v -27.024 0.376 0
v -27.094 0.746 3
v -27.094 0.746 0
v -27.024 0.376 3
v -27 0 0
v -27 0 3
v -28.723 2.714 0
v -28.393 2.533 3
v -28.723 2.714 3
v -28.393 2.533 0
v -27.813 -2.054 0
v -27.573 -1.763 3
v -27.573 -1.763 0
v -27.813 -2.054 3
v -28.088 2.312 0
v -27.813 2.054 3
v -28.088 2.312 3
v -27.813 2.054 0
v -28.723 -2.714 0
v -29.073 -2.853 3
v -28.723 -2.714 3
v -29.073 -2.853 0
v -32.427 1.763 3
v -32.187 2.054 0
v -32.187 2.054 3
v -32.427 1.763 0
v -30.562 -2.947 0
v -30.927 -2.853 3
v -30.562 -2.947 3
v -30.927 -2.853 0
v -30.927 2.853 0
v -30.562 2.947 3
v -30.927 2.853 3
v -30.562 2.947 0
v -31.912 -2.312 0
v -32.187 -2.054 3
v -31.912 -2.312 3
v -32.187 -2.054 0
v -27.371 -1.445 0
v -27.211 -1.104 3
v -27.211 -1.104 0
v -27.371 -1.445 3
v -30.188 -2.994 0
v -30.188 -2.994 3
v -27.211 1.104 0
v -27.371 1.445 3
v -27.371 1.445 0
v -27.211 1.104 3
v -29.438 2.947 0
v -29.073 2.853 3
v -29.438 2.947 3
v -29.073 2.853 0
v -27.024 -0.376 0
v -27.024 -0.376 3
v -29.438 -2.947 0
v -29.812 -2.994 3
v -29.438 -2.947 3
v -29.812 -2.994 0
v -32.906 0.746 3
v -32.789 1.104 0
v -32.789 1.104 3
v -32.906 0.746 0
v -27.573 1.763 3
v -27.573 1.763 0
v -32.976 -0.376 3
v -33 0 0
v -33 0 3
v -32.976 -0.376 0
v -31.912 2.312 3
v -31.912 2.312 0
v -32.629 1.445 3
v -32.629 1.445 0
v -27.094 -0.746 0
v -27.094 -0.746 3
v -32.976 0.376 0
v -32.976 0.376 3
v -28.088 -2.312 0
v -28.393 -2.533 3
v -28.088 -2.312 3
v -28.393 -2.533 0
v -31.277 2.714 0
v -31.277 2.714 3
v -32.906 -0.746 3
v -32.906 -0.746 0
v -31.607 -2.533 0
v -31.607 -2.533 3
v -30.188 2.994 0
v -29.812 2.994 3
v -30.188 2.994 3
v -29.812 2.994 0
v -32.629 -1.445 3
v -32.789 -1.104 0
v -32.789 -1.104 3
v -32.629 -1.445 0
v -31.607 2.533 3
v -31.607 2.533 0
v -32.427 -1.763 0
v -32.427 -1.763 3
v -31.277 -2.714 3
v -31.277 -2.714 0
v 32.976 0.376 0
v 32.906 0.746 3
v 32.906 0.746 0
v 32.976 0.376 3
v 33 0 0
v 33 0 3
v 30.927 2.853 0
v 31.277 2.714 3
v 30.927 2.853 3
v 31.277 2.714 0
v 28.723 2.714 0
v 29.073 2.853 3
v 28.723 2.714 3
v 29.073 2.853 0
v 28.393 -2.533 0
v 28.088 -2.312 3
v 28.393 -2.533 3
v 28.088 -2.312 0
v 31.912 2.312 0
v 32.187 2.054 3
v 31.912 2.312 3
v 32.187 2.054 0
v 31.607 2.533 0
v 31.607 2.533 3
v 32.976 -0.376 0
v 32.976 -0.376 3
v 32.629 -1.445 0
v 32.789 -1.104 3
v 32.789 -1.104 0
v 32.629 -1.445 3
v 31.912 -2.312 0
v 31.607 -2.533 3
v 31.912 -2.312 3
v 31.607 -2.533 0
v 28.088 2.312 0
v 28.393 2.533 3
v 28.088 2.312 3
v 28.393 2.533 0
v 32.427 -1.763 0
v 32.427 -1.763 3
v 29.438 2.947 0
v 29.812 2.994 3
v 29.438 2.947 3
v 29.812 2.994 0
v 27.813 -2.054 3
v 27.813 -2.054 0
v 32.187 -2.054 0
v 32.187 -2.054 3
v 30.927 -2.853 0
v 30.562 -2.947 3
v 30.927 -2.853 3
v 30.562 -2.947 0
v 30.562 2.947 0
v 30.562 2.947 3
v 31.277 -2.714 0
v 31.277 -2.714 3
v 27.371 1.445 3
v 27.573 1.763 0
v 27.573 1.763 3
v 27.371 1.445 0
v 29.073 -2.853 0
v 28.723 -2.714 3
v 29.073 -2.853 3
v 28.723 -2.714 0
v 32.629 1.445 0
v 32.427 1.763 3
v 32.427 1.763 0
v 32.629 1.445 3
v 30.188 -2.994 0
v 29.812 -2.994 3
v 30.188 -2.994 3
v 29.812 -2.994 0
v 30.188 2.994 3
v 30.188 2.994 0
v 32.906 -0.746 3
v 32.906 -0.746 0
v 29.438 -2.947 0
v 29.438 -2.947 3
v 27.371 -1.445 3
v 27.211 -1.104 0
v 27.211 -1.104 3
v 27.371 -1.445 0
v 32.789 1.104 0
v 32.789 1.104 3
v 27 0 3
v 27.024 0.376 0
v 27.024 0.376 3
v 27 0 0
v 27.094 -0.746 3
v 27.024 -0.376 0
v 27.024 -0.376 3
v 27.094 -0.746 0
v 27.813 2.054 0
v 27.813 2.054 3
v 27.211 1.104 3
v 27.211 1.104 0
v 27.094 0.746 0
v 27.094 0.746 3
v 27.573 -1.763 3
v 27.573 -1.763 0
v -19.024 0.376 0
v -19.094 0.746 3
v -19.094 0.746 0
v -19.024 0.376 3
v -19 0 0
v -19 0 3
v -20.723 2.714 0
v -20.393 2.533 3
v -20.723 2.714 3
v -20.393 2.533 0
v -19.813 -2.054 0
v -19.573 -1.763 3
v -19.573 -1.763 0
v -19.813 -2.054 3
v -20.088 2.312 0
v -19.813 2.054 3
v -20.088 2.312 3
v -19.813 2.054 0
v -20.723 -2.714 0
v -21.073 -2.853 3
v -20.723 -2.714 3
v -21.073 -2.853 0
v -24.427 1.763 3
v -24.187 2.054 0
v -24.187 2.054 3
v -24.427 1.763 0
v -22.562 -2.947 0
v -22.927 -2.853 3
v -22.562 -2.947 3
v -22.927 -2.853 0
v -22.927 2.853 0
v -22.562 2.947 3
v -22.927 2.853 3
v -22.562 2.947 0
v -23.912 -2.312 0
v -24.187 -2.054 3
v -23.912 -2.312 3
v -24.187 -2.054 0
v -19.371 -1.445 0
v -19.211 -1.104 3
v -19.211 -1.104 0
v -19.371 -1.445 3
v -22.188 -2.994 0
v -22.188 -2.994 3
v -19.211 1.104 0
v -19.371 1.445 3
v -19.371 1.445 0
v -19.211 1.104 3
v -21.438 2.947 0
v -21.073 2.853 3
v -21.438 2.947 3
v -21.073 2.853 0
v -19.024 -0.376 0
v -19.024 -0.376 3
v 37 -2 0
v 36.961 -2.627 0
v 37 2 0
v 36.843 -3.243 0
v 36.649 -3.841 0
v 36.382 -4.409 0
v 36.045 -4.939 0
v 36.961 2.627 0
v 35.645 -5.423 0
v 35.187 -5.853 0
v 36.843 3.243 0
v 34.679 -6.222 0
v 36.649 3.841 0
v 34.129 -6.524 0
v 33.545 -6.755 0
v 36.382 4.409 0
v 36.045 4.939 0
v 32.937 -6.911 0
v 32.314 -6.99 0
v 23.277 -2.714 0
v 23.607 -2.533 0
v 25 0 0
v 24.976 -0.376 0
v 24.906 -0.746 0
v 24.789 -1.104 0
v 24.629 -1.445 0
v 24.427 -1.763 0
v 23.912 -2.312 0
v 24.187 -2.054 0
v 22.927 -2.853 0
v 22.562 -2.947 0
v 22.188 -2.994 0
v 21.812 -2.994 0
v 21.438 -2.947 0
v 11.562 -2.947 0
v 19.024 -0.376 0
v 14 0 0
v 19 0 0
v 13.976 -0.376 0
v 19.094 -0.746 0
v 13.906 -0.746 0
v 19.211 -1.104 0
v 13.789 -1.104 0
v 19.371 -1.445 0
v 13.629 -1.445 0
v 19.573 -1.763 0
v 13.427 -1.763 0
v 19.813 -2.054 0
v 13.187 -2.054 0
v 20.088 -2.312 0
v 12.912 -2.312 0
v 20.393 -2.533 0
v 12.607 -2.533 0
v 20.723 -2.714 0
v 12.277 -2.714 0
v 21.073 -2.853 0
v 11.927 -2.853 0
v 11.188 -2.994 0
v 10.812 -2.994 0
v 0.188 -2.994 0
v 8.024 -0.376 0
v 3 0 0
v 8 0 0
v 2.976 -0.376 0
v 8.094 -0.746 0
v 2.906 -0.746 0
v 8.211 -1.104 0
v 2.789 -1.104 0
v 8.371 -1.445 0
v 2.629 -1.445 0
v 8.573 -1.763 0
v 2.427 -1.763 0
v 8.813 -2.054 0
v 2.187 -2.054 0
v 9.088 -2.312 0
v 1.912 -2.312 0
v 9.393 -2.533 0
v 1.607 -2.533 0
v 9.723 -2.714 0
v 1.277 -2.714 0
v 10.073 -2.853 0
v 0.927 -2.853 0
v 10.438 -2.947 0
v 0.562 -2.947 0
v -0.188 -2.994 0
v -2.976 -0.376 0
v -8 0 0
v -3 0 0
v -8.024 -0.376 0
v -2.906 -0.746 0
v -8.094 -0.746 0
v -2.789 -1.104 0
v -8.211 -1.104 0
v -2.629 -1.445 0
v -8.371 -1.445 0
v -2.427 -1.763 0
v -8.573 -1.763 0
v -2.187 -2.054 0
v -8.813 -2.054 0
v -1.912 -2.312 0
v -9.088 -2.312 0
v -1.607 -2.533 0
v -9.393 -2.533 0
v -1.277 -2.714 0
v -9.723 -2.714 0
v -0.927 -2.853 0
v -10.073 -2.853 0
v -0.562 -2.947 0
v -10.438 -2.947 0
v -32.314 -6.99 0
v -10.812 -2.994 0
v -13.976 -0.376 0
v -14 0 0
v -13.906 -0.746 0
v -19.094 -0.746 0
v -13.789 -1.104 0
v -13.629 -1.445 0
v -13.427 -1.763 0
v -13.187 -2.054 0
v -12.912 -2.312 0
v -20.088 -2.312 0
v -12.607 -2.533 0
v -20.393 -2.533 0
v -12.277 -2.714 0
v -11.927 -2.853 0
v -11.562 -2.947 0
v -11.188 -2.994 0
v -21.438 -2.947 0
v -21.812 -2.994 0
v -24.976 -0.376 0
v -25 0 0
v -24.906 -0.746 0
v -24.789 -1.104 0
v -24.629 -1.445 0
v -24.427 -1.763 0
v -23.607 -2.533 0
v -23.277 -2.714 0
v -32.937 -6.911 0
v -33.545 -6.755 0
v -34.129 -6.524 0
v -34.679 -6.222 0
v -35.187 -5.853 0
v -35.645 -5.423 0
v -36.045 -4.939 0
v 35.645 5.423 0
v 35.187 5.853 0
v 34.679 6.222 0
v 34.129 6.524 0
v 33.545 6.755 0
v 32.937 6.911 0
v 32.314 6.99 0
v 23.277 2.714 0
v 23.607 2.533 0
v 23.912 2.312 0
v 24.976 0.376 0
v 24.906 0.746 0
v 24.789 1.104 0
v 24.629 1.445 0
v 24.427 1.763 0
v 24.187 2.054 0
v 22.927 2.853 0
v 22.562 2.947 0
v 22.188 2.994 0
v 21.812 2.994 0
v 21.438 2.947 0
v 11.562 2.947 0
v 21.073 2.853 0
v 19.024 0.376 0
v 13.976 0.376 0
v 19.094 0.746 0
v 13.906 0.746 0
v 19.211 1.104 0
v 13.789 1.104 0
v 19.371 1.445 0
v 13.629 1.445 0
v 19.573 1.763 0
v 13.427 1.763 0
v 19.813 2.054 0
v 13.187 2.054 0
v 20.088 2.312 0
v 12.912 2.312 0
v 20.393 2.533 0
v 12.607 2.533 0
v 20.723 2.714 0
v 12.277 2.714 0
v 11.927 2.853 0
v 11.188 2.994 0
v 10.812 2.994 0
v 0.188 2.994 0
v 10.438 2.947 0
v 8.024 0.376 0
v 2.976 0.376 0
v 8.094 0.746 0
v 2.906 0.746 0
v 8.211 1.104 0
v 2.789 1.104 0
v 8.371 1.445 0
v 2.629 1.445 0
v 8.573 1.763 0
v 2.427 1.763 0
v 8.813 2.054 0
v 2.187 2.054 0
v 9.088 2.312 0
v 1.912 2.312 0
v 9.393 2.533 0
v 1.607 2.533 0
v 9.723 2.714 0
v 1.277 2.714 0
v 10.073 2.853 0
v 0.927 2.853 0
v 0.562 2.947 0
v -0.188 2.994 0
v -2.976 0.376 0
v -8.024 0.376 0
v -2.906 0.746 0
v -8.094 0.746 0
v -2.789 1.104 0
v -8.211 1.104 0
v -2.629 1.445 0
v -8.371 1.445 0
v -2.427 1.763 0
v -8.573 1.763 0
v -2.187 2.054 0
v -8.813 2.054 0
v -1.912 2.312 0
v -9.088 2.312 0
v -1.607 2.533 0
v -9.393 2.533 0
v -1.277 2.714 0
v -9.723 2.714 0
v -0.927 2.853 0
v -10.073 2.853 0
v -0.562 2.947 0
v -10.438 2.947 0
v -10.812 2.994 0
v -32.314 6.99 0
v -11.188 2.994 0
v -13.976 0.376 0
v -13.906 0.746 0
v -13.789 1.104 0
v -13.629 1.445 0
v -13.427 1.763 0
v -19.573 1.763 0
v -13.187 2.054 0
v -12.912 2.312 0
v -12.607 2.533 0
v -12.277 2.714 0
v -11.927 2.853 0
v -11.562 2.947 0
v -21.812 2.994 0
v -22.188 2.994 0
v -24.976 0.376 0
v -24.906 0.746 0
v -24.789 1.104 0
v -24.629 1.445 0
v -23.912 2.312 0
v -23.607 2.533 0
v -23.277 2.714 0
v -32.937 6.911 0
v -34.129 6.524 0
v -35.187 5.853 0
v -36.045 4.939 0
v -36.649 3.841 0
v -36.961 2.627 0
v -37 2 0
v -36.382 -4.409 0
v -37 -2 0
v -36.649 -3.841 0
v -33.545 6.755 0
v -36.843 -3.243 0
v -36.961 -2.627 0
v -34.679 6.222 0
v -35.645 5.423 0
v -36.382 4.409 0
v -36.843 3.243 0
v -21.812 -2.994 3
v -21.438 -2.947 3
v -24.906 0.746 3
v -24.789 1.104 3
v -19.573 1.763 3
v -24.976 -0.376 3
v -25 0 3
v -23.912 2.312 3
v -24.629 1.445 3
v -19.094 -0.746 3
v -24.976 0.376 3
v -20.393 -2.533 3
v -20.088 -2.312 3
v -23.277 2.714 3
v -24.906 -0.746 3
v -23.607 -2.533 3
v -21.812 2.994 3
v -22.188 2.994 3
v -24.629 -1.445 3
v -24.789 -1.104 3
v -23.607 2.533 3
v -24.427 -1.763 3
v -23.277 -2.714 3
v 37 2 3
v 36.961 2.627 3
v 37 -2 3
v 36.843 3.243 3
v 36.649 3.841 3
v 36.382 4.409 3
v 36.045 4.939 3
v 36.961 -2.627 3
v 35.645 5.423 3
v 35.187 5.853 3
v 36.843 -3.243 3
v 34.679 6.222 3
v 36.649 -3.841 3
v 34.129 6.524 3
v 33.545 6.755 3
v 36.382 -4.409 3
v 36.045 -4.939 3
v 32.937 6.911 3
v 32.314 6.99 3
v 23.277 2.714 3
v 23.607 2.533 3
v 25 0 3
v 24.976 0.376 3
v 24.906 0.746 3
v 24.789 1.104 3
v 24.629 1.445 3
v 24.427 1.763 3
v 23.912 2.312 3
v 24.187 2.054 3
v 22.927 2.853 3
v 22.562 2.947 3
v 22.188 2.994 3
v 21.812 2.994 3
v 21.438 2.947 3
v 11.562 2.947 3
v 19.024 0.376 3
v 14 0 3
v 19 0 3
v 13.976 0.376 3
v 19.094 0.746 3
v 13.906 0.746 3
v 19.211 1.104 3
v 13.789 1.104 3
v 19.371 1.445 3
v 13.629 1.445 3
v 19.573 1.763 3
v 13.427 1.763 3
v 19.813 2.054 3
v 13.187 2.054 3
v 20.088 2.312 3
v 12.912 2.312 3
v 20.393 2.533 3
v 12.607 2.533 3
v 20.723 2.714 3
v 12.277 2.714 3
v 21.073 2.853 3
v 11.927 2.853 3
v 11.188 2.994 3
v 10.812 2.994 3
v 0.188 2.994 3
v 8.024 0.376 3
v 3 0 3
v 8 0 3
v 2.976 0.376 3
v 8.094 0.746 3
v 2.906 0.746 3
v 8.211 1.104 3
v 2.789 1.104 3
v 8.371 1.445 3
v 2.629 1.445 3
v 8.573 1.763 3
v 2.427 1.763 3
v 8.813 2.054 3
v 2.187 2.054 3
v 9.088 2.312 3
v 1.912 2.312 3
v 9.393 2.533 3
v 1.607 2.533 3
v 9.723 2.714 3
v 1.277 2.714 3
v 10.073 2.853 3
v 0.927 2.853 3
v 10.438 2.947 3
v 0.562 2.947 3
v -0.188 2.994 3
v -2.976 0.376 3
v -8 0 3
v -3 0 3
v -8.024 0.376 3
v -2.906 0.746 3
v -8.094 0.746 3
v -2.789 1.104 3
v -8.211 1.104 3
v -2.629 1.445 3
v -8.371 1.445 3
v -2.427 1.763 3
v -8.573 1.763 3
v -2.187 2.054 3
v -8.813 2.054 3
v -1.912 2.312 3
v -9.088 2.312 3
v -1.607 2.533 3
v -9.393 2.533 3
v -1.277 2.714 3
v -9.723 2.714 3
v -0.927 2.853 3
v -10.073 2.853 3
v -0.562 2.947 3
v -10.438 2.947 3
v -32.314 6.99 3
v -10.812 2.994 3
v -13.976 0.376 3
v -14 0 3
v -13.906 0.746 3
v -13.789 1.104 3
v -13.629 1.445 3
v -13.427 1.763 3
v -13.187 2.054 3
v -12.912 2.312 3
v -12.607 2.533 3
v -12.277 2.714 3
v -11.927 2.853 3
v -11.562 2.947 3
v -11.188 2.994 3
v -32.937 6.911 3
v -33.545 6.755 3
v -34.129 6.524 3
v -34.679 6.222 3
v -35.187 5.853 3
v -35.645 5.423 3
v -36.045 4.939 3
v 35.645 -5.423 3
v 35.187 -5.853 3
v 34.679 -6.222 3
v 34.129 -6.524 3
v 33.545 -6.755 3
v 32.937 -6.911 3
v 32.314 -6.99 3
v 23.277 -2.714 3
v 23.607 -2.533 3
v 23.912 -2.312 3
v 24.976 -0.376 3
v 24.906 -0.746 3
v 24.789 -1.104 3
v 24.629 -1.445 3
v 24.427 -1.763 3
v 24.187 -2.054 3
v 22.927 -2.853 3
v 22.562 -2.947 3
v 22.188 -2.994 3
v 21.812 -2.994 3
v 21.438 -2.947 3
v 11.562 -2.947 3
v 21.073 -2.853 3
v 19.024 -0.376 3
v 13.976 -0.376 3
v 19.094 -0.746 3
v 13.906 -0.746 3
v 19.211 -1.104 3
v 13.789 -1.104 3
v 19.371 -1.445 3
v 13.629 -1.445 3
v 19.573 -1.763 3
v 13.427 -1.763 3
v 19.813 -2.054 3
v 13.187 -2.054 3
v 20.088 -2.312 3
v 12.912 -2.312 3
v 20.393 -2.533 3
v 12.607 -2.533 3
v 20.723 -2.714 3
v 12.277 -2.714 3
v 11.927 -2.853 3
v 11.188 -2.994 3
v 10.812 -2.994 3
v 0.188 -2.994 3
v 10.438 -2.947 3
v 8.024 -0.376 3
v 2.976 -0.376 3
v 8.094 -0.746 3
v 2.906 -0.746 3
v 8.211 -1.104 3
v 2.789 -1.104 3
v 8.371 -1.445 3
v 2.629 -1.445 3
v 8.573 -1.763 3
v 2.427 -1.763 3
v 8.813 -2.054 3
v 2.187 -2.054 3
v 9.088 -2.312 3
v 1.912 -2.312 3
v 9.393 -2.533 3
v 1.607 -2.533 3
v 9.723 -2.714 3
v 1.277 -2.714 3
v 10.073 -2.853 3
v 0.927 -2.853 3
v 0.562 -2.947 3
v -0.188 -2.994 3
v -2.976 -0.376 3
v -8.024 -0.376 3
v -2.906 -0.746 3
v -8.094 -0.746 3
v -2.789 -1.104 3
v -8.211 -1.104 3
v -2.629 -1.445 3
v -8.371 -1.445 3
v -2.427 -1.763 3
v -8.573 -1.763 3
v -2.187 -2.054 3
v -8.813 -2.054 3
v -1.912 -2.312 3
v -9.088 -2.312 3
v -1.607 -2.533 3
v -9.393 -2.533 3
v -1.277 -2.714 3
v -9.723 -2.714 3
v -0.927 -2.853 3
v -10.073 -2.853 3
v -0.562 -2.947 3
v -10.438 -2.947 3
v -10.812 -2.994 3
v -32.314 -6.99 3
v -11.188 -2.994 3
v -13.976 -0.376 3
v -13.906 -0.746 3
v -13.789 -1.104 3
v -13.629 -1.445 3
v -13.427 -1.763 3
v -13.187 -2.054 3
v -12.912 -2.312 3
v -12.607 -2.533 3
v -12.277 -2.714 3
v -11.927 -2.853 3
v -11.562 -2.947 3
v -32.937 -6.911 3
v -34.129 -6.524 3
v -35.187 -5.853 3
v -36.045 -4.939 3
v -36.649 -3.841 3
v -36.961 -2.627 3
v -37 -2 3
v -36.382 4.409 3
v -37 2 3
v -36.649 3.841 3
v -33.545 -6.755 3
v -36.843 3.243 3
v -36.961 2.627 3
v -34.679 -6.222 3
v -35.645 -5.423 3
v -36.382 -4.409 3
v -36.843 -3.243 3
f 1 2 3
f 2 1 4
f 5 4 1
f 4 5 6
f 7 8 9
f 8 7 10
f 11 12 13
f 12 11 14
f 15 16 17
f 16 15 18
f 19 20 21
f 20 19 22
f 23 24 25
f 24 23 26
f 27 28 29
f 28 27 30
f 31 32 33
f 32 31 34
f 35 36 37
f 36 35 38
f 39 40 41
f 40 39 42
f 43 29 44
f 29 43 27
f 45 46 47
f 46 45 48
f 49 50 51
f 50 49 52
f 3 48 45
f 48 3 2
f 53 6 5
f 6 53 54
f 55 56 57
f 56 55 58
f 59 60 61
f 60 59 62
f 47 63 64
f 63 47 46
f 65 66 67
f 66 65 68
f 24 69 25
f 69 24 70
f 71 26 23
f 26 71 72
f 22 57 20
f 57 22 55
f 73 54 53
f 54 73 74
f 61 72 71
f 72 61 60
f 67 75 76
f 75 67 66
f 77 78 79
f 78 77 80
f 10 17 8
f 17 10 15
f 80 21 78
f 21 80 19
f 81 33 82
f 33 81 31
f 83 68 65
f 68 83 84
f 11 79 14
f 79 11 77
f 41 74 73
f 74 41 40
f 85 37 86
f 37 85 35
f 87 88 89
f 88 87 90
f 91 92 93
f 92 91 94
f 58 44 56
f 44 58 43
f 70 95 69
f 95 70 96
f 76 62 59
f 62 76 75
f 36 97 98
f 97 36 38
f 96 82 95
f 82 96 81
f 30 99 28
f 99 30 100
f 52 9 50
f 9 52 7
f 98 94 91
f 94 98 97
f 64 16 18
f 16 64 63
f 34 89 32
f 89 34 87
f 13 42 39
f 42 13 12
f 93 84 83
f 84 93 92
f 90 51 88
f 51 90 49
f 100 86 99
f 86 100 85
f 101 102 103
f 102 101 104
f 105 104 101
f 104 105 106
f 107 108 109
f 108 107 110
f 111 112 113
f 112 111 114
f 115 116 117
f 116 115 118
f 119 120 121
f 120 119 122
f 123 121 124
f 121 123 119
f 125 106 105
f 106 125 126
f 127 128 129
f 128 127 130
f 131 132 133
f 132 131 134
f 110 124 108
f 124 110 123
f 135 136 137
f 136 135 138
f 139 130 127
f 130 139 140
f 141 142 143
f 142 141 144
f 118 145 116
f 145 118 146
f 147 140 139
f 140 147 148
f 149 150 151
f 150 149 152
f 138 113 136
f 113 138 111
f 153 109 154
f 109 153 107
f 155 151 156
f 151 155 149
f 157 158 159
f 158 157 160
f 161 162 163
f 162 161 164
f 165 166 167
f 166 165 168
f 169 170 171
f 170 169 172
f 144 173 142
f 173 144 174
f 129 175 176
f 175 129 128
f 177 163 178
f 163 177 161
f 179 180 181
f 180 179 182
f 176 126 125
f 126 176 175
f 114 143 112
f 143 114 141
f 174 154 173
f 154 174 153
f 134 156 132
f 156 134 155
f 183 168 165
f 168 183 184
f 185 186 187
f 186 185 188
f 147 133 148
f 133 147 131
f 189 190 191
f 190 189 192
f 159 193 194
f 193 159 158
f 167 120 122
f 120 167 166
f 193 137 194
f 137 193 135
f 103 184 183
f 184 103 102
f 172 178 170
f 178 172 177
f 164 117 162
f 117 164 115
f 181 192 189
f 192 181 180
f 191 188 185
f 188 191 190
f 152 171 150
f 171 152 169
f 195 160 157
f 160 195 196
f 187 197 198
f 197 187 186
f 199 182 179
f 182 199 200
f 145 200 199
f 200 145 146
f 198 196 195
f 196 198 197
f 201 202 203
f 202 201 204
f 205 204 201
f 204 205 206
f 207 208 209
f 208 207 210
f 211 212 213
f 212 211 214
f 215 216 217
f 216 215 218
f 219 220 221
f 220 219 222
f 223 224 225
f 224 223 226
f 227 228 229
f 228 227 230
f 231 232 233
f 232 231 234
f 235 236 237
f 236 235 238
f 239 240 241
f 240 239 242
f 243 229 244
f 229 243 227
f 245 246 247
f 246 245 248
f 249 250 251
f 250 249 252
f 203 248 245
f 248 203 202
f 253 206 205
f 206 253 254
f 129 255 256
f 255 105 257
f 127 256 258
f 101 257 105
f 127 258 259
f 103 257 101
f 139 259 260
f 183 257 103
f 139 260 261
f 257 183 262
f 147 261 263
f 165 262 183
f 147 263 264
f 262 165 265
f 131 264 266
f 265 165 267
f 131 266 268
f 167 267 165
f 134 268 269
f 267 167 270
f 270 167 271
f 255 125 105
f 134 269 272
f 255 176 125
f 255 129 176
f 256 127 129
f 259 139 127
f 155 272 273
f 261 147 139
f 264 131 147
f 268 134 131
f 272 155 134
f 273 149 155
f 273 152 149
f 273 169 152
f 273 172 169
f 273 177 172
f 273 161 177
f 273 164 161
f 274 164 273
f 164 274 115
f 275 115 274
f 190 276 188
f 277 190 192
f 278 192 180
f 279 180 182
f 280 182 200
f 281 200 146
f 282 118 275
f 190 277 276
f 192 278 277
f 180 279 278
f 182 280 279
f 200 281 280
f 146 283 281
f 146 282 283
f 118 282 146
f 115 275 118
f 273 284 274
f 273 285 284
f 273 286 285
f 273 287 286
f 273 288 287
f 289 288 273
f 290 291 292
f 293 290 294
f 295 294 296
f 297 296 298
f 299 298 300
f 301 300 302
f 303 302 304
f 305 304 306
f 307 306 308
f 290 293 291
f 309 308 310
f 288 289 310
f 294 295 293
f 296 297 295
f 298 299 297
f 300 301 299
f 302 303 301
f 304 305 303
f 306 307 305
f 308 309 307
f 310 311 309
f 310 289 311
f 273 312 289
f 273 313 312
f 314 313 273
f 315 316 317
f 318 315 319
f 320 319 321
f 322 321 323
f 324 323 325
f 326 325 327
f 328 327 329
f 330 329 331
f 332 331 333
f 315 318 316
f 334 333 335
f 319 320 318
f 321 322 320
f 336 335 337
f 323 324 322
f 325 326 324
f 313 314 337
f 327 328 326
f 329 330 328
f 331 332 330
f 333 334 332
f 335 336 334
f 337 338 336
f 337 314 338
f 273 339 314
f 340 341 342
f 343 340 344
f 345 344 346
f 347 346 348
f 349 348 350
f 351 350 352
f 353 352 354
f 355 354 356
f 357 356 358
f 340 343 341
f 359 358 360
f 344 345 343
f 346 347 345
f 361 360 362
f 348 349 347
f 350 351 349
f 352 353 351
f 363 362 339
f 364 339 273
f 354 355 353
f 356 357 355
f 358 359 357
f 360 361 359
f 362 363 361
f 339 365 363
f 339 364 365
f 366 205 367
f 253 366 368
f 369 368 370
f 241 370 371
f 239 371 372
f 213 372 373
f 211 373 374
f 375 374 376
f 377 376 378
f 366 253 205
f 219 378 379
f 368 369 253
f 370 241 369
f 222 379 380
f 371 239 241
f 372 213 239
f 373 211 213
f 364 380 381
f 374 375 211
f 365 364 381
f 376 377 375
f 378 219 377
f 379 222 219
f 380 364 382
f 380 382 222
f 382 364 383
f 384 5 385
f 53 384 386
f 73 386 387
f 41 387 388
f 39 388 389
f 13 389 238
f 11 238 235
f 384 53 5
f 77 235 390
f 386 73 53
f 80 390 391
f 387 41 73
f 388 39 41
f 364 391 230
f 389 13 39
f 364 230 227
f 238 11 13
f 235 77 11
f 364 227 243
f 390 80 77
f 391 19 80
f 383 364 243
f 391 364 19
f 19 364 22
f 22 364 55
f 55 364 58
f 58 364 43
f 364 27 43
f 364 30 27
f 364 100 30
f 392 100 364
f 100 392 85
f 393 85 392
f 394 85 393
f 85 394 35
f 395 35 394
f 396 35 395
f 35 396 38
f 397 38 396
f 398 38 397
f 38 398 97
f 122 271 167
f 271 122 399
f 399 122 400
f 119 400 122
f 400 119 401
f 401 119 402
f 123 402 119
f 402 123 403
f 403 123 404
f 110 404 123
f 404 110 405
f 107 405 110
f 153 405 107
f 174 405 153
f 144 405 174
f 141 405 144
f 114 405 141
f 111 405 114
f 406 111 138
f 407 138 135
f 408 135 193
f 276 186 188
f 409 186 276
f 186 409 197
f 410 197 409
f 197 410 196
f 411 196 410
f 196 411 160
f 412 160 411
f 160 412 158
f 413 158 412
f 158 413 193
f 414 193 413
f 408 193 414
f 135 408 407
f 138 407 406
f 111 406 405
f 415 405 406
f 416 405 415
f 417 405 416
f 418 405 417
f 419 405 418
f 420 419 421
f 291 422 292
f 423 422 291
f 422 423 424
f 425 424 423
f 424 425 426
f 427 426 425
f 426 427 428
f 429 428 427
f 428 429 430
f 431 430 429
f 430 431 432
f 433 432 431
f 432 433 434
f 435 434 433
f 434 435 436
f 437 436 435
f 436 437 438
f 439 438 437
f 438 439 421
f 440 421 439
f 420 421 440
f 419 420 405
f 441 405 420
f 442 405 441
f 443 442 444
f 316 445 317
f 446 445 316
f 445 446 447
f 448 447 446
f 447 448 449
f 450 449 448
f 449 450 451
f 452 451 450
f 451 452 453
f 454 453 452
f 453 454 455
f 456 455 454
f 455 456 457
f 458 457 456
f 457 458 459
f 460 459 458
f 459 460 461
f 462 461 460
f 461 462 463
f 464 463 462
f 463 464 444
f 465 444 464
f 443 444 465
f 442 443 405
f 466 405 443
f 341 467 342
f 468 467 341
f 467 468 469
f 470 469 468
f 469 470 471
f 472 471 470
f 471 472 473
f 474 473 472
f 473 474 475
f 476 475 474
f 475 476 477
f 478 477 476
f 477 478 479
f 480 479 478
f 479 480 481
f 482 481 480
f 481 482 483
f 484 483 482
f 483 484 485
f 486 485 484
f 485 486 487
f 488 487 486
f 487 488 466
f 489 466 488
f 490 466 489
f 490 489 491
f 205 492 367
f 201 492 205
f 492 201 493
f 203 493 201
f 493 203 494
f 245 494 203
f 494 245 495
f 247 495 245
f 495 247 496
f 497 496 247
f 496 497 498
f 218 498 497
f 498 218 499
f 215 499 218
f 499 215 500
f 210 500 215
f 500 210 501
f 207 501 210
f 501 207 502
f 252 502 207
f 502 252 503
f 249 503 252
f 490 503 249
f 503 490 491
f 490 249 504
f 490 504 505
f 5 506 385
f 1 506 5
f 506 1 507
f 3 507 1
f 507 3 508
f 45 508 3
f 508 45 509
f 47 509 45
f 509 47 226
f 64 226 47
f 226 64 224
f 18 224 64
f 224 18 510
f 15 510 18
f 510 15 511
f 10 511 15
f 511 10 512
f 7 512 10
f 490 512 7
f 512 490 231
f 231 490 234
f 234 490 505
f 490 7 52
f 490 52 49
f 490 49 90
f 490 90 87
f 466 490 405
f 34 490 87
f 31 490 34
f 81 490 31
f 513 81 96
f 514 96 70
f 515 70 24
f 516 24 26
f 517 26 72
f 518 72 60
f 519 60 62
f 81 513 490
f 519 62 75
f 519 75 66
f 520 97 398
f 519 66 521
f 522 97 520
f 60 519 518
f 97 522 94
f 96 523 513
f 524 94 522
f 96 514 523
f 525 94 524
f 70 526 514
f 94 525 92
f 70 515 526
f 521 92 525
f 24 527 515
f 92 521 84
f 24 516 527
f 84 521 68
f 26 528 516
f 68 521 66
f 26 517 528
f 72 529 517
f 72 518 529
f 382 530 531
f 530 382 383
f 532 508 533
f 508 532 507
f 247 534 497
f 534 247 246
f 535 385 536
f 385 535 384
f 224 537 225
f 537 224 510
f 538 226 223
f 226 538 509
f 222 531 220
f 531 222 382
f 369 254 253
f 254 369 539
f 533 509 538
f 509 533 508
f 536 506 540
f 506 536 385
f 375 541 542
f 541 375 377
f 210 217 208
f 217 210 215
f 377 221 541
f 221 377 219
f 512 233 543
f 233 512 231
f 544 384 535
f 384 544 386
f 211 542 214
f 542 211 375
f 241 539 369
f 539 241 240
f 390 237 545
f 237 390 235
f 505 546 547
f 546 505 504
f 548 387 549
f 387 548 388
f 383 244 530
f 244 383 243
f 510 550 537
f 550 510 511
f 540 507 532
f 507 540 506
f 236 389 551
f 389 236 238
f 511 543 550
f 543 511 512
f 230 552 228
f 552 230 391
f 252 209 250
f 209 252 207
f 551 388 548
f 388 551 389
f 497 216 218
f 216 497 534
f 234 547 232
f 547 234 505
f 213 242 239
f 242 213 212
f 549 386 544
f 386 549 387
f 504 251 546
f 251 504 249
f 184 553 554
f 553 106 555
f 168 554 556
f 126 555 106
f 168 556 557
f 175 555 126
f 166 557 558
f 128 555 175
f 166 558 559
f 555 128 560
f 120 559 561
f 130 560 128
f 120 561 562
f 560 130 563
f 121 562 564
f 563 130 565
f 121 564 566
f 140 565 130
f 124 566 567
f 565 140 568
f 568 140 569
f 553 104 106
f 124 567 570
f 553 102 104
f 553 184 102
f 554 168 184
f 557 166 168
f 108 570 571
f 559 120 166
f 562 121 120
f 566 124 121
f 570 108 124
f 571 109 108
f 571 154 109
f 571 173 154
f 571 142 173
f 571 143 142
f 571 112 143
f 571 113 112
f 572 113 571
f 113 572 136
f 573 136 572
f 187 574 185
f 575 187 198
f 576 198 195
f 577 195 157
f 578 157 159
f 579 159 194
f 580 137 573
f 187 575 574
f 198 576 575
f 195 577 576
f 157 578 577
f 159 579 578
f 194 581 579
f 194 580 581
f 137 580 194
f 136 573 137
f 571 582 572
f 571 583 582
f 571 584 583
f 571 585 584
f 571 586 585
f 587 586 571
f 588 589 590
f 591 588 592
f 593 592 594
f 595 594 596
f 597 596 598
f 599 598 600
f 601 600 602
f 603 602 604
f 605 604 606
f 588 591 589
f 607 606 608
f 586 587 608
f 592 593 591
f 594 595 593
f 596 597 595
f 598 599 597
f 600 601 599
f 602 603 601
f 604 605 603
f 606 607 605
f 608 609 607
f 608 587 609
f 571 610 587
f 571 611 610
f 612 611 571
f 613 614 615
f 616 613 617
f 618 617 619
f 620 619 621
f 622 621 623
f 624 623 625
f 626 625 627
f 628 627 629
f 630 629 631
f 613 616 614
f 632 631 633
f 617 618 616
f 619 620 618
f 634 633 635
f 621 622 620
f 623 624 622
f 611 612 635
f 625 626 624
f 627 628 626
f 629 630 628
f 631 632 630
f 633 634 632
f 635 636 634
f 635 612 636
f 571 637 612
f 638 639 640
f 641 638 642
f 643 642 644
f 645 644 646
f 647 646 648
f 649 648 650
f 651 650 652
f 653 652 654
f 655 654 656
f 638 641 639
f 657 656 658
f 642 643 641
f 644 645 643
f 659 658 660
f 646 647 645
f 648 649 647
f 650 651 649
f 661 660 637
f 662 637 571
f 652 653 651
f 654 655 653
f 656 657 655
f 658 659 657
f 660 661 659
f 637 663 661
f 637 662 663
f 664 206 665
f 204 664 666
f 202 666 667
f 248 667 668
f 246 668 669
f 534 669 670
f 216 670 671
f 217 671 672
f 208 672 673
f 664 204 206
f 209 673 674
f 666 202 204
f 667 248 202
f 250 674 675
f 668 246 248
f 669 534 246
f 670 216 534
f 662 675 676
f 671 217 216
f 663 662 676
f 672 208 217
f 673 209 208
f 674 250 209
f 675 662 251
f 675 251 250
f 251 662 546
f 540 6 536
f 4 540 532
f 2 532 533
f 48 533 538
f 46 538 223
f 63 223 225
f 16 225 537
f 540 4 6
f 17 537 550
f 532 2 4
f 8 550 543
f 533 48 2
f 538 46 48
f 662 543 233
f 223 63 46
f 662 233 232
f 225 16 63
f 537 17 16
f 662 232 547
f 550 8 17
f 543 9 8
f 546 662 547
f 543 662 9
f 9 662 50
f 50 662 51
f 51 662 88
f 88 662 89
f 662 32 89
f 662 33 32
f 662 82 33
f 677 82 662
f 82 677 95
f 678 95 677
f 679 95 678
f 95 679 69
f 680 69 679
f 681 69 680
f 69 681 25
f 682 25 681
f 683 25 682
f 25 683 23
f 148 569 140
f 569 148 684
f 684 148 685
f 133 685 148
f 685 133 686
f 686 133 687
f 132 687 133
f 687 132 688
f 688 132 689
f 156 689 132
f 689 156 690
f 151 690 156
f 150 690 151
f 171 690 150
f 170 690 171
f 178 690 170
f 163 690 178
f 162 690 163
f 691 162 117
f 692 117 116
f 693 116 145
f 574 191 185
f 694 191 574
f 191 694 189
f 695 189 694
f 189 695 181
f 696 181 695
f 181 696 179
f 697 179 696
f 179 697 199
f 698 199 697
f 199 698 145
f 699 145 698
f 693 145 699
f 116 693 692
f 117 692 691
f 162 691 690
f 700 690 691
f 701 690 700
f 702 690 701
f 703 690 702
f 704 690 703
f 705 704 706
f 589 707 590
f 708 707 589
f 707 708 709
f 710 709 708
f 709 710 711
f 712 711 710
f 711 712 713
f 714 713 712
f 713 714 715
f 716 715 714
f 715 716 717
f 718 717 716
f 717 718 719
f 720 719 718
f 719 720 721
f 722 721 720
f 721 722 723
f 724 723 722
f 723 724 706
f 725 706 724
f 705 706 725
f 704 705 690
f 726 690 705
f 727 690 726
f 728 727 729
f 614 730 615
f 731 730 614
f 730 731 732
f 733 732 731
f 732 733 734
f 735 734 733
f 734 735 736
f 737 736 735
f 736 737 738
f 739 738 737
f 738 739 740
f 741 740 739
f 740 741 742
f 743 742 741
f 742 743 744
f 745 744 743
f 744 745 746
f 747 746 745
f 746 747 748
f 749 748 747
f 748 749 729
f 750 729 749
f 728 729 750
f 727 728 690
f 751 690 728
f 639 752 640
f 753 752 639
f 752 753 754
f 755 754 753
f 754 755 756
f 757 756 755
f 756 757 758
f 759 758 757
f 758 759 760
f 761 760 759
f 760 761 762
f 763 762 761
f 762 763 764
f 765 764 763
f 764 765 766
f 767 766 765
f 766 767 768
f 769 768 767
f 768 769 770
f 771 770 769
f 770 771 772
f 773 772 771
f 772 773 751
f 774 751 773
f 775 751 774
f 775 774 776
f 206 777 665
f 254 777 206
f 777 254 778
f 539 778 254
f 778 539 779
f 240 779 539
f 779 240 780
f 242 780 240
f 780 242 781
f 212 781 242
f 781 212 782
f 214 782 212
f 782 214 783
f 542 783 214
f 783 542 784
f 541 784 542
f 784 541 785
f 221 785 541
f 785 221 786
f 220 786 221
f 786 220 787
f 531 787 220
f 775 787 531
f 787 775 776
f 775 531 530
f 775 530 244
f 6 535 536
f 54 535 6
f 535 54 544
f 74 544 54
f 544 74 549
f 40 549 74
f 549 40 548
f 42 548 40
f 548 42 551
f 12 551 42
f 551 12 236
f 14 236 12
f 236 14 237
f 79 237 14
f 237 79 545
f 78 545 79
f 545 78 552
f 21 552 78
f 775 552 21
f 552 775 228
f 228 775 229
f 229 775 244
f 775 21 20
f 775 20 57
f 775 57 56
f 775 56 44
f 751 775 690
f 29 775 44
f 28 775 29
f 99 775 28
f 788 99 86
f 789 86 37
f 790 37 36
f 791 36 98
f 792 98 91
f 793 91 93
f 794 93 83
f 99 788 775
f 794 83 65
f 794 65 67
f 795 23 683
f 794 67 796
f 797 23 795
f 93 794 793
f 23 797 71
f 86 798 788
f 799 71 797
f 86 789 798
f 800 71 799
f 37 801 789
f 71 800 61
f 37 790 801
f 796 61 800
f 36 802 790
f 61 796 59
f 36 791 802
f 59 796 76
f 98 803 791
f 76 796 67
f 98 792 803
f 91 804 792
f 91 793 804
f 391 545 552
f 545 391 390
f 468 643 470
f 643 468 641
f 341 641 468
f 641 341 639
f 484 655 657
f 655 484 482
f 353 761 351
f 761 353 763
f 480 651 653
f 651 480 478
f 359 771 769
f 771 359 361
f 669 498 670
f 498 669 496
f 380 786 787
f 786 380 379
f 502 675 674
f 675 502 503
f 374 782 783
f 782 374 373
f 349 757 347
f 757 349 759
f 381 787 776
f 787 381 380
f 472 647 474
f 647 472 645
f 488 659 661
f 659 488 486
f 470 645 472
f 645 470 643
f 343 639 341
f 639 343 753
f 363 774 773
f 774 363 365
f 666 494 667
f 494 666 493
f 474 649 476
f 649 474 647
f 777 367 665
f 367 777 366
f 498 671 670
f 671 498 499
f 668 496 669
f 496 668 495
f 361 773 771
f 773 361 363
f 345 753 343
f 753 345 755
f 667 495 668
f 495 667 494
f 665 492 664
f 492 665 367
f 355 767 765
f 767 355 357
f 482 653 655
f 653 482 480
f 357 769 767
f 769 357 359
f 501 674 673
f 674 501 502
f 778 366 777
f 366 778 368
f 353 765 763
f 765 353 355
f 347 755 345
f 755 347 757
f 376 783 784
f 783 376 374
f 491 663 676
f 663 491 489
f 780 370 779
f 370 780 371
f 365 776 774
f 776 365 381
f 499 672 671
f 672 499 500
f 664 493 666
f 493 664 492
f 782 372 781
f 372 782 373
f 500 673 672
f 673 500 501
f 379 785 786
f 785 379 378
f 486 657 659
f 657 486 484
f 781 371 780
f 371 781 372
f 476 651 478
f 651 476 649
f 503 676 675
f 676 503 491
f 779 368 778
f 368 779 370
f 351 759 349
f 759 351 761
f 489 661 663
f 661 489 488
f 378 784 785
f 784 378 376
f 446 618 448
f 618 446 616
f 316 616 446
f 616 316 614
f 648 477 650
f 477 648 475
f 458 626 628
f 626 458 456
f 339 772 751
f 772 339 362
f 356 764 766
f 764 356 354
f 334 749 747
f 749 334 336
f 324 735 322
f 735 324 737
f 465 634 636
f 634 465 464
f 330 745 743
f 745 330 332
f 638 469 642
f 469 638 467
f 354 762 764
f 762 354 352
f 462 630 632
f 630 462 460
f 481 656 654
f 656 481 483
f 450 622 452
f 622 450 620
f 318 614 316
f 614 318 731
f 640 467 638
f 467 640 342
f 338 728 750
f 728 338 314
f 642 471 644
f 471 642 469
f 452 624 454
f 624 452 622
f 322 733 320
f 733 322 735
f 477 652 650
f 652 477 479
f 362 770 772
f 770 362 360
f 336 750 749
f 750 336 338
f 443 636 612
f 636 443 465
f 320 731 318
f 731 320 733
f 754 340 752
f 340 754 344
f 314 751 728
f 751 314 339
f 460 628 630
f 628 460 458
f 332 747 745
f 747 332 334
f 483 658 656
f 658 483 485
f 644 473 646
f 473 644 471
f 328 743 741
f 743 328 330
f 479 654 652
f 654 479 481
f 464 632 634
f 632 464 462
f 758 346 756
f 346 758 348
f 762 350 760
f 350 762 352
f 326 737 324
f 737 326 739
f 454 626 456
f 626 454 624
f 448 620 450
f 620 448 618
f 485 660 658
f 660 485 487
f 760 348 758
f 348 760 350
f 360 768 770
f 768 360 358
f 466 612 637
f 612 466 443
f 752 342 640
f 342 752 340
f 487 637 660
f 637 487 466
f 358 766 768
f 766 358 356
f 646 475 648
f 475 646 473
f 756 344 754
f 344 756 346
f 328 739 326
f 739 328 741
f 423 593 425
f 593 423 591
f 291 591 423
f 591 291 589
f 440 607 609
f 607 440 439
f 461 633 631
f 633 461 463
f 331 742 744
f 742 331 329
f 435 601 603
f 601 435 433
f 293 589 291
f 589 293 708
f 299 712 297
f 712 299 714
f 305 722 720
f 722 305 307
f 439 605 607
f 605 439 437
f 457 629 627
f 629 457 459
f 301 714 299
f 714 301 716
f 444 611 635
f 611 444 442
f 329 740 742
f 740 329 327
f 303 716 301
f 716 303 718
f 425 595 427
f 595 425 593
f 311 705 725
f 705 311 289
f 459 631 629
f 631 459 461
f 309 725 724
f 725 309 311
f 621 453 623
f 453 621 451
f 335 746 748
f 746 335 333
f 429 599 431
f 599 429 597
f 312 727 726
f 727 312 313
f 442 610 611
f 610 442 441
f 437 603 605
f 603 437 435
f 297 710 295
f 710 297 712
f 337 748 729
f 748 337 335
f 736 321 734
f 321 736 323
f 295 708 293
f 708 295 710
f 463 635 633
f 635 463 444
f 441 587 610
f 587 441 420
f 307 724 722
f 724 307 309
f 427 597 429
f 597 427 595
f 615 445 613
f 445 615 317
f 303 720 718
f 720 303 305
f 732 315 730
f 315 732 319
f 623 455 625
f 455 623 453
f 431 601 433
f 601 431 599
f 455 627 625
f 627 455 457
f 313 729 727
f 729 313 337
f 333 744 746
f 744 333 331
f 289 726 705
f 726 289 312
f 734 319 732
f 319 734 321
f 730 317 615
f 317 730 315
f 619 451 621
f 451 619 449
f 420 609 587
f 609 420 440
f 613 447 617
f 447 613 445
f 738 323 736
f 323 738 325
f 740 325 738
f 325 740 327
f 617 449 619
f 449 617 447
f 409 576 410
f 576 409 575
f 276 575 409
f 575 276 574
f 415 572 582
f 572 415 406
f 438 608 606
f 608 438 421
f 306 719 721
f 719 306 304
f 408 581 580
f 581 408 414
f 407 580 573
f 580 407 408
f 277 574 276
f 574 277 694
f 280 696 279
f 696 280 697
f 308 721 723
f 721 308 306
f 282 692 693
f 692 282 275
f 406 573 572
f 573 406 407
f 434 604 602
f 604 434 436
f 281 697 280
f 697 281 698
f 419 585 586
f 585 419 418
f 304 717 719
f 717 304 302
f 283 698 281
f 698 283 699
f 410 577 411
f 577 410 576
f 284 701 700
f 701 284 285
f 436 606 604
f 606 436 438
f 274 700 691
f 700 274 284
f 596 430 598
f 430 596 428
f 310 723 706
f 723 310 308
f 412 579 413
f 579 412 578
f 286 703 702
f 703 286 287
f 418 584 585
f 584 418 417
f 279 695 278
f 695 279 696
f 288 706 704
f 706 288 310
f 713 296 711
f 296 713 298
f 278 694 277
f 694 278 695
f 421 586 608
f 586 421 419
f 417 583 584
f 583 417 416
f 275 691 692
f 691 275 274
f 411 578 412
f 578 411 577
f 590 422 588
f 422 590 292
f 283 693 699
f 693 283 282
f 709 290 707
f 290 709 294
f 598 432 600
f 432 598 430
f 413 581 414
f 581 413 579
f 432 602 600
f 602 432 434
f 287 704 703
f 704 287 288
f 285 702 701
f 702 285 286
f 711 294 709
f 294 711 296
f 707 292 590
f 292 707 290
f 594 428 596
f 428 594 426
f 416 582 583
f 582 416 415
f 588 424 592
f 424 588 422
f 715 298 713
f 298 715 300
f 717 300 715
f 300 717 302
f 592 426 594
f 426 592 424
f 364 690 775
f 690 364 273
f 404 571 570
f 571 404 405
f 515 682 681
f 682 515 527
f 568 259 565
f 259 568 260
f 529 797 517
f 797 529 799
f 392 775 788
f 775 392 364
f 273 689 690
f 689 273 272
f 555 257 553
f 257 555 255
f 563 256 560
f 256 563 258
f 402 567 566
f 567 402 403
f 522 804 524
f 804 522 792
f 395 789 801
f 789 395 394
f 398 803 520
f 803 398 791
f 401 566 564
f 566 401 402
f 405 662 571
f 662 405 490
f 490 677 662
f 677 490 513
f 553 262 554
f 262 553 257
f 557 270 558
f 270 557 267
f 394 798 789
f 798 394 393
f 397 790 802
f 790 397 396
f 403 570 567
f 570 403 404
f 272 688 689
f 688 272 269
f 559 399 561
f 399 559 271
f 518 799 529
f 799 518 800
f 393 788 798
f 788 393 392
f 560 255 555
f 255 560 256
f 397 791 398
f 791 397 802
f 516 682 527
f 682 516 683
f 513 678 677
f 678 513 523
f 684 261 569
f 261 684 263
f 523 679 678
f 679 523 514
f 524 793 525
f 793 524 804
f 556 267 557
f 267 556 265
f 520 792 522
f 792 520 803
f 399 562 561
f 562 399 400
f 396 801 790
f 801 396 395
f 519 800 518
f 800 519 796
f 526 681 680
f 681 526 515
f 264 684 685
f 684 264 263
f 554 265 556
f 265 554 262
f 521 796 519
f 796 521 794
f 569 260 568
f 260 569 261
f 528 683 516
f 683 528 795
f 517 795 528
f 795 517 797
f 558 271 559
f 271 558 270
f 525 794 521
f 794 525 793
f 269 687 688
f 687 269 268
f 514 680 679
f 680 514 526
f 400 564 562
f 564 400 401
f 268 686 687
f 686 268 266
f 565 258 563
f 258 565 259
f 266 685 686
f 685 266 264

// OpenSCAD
$fn = 50;


difference() {
	union() {
		hull() {
			translate(v = [-32.0000000000, 2.0000000000, 0]) {
				cylinder(h = 3, r = 5);
			}
			translate(v = [32.0000000000, 2.0000000000, 0]) {
				cylinder(h = 3, r = 5);
			}
			translate(v = [-32.0000000000, -2.0000000000, 0]) {
				cylinder(h = 3, r = 5);
			}
			translate(v = [32.0000000000, -2.0000000000, 0]) {
				cylinder(h = 3, r = 5);
			}
		}
	}
	union() {
		#translate(v = [-30.0000000000, 0.0000000000, 0]) {
			cylinder(h = 3, r = 3.0000000000);
		}
		#translate(v = [30.0000000000, 0.0000000000, 0]) {
			cylinder(h = 3, r = 3.0000000000);
		}
		#translate(v = [-30.0000000000, 0.0000000000, -100.0000000000]) {
			cylinder(h = 200, r = 3.0000000000);
		}
		#translate(v = [-30.0000000000, 0.0000000000, -100.0000000000]) {
			cylinder(h = 200, r = 3.0000000000);
		}
		#translate(v = [30.0000000000, 0.0000000000, -100.0000000000]) {
			cylinder(h = 200, r = 3.0000000000);
		}
		#translate(v = [30.0000000000, 0.0000000000, -100.0000000000]) {
			cylinder(h = 200, r = 3.0000000000);
		}
		#translate(v = [-30.0000000000, 0.0000000000, 0]) {
			cylinder(h = 3, r = 1.5000000000);
		}
		#translate(v = [30.0000000000, 0.0000000000, 0]) {
			cylinder(h = 3, r = 1.5000000000);
		}
		#translate(v = [-30.0000000000, 0.0000000000, 0]) {
			cylinder(h = 3, r = 1.5000000000);
		}
		#translate(v = [30.0000000000, 0.0000000000, 0]) {
			cylinder(h = 3, r = 1.5000000000);
		}
		#translate(v = [-30.0000000000, 0.0000000000, 0]) {
			cylinder(h = 3, r = 1.5000000000);
		}
		#translate(v = [30.0000000000, 0.0000000000, 0]) {
			cylinder(h = 3, r = 1.5000000000);
		}
		#translate(v = [-22.0000000000, 0, 0]) {
			cylinder(h = 3, r = 3.0000000000);
		}
		#translate(v = [-11.0000000000, 0, 0]) {
			cylinder(h = 3, r = 3.0000000000);
		}
		#cylinder(h = 3, r = 3.0000000000);
		#translate(v = [11.0000000000, 0, 0]) {
			cylinder(h = 3, r = 3.0000000000);
		}
		#translate(v = [22.0000000000, 0, 0]) {
			cylinder(h = 3, r = 3.0000000000);
		}
	}
}
